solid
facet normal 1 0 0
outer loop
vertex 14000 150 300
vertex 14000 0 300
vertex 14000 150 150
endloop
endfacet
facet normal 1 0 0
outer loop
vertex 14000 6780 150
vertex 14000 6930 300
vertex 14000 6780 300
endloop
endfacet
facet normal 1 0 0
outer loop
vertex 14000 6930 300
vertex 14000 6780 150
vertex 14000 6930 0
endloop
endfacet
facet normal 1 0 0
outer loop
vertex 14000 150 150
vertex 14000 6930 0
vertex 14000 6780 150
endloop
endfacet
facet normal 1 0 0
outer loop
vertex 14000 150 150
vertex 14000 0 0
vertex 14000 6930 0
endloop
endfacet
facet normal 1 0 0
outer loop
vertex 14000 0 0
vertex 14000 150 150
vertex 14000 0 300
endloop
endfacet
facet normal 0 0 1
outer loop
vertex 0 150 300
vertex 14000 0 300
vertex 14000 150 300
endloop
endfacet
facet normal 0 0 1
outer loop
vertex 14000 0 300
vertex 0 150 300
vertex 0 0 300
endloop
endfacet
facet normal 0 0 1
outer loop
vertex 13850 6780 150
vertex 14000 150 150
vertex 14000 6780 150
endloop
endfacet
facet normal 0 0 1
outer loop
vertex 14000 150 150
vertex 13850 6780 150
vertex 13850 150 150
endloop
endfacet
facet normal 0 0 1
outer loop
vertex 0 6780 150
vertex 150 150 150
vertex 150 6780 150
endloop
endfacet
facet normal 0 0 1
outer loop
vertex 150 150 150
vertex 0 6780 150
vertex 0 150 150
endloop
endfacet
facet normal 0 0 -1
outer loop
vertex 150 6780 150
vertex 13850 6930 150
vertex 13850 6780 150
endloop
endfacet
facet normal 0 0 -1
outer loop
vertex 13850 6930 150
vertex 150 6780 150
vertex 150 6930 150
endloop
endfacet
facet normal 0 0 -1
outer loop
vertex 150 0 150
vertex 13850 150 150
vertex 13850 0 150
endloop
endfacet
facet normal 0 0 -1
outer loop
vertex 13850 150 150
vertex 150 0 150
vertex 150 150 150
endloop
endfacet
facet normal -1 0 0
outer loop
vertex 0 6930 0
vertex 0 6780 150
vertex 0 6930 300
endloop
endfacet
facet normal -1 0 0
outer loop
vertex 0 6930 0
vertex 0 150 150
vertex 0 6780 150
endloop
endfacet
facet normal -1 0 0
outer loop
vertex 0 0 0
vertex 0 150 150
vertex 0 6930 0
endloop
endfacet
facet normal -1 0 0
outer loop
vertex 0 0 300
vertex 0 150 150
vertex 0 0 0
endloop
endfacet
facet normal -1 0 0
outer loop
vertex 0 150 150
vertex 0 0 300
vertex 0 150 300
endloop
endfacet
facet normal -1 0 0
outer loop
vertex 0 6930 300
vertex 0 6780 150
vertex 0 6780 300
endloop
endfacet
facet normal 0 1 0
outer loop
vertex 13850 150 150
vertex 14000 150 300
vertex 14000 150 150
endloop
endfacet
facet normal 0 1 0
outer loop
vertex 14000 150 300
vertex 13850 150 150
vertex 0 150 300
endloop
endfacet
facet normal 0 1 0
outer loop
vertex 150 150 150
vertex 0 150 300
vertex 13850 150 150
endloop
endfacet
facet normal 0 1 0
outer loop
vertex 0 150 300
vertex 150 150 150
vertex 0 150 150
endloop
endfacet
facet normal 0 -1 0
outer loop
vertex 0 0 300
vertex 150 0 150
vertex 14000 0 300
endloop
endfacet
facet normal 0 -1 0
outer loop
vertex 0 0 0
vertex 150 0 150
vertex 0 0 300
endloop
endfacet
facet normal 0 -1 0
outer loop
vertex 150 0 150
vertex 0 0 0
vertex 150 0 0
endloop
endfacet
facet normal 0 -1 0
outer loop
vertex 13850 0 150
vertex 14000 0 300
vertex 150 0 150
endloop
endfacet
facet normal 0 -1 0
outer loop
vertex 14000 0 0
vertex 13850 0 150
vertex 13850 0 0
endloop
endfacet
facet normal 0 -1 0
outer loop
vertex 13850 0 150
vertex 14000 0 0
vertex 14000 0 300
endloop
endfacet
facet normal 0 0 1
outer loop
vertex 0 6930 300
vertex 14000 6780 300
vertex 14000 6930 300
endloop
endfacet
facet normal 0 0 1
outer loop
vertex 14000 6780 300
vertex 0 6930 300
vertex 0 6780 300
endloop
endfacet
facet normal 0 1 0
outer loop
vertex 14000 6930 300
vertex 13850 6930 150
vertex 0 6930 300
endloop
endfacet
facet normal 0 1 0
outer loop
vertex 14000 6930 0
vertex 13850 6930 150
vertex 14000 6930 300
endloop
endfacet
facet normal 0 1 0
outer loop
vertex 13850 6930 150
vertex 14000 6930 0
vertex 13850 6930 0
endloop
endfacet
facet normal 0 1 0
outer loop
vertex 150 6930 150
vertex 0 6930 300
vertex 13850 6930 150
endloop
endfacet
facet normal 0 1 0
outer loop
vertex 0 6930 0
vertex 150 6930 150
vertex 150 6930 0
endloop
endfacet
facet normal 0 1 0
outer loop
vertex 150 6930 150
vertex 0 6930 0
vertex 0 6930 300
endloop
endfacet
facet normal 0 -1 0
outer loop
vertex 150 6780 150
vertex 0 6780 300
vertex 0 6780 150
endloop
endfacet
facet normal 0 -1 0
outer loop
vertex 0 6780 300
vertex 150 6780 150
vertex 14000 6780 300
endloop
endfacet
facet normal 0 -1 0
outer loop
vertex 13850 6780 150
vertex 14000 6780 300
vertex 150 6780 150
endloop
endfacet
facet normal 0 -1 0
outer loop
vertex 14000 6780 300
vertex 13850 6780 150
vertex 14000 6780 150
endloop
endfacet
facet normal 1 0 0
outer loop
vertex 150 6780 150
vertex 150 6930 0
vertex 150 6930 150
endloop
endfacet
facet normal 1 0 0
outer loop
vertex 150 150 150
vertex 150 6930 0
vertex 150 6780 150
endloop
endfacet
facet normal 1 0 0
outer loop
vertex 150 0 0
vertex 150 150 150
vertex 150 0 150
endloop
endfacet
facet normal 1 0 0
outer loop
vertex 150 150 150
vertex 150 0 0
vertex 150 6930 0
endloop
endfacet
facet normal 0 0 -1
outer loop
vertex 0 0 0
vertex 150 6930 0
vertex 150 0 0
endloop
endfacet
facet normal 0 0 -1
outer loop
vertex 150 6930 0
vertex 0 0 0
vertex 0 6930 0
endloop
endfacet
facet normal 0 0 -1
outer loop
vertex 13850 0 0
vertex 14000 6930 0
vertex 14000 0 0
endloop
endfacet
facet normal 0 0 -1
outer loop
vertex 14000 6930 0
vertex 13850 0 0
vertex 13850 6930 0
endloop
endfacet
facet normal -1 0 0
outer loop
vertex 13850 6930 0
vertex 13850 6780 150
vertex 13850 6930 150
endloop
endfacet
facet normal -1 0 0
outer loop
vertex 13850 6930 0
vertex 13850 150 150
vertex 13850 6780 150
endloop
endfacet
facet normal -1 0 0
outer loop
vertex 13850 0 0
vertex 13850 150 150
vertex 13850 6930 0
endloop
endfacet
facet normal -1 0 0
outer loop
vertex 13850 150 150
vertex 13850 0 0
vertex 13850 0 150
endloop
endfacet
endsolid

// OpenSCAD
// file: house_params.scad
// F-Roof: A multi-function single-layer roof
// https://github.com/f-roof
// Author: Mihai Oltean; https://mihaioltean.github.io
//---------------------------------------------------------------------------------------
base_length = 14000;
base_house_width = 6930;
house_height = 2000;

base_beam_side = 150; // this was already there on the top of the house
//---------------------------------------------------------------------------------------
// main file
// F-Roof: A multi-function single-layer roof
// https://github.com/f-roof
// Author: Mihai Oltean; https://mihaioltean.github.io
// -----------------------------------------------------------------------------------
include <house_params.scad>
//---------------------------------------------------------------------------------------
module house()
{
    cube([base_length, base_house_width, house_height]);
}
//---------------------------------------------------------------------------------------
module roof_wood_support_on_house()
{
// long side
    translate ([0, 0, base_beam_side]) 
        cube([base_length, base_beam_side, base_beam_side]);
    
    translate ([0, 0, base_beam_side]) 
        translate ([0, base_house_width - base_beam_side, 0]) 
            cube([base_length, base_beam_side, base_beam_side]);
        
   // short side     
    translate ([0, 0, 0]) 
        cube([base_beam_side, base_house_width, base_beam_side]);
    translate ([base_length - base_beam_side, 0, 0]) 
        cube([base_beam_side, base_house_width, base_beam_side]);    
}
//---------------------------------------------------------------------------------------
roof_wood_support_on_house(); // this was already there
